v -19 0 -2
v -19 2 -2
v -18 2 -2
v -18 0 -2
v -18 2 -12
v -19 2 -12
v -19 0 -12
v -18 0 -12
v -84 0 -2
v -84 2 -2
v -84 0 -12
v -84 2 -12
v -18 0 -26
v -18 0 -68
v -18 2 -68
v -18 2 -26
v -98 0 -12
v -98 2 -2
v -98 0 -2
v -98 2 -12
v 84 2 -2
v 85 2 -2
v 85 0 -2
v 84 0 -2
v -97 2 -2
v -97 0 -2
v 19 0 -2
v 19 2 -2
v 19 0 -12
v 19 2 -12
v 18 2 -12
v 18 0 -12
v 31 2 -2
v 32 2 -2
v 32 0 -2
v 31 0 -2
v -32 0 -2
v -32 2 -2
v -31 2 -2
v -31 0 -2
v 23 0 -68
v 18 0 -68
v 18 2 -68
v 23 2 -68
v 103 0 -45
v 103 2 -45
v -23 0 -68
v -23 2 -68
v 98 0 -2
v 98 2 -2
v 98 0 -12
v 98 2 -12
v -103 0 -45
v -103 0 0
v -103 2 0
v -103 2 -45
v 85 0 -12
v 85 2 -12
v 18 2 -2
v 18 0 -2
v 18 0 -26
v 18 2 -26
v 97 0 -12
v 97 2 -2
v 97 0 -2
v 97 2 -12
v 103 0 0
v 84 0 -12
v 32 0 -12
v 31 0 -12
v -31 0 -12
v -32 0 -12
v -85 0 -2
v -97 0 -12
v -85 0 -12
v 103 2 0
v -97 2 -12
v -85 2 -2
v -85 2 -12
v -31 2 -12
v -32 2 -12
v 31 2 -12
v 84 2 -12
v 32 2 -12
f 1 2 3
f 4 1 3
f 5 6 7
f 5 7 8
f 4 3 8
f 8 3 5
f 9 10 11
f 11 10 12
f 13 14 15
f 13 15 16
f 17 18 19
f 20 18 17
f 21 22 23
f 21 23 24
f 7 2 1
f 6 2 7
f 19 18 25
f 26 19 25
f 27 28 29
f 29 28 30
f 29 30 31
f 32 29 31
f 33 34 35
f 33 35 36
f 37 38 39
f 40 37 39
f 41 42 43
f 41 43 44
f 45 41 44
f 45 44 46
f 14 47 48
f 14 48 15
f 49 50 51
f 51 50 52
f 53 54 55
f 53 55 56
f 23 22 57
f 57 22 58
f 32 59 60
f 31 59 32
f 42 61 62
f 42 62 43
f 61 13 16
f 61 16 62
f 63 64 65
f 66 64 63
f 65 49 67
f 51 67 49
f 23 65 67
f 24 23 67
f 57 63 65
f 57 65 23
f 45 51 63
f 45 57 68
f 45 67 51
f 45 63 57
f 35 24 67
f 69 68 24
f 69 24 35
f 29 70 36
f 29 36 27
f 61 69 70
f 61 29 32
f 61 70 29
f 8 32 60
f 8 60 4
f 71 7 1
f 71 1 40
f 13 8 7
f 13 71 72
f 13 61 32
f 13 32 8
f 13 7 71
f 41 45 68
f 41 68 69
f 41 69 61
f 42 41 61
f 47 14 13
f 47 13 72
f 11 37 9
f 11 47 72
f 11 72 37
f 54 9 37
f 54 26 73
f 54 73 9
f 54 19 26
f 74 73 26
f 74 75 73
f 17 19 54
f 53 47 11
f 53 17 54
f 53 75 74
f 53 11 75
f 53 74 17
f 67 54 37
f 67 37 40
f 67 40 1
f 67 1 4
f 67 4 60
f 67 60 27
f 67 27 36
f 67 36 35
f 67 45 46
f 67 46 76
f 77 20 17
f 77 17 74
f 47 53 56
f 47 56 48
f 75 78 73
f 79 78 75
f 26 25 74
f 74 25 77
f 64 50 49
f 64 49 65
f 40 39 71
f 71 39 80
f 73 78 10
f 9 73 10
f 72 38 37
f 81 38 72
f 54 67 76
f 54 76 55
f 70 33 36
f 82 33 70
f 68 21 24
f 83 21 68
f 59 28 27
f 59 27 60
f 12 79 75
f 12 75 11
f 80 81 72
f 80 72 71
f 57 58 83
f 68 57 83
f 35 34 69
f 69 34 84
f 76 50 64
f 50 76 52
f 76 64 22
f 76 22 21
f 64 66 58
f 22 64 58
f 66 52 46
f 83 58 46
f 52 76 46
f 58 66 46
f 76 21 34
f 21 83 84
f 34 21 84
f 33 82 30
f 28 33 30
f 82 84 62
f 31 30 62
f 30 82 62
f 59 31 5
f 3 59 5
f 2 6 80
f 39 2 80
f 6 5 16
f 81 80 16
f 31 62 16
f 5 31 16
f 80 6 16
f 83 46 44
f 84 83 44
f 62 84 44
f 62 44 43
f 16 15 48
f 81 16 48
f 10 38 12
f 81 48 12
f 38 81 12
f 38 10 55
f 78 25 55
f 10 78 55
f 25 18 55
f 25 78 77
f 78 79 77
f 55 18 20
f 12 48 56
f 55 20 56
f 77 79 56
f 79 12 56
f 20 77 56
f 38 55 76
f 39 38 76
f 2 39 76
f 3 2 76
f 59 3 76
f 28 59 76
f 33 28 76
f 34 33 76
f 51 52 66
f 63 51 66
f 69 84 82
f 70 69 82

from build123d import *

# Parameters (mm, degrees)
BOSS_EXTRUDE1_DEPTH = 2
SKETCH4_W           = 1
SKETCH4_H           = 10
CUT_EXTRUDE1_DEPTH  = 124.438243669


with BuildPart() as part:
    # Sketch3 → Boss-Extrude1 (new body)
    with BuildSketch(Plane(origin=(0, 0, 0), x_dir=(1, 0, 0), z_dir=(0, 1, 0))):
        Polygon((-103, 0), (-103, 45), (-23, 68), (-18, 68), (-18, 26), (18, 26), (18, 68), (23, 68), (103, 45), (103, 0), align=None)
    extrude(amount=BOSS_EXTRUDE1_DEPTH)

    # Sketch4 → Cut-Extrude1 (cut, through all)
    with BuildSketch(Plane(origin=(0, 2, 0), x_dir=(1, 0, 0), z_dir=(0, 1, 0))):
        with Locations((-97.5, 7)):
            Rectangle(SKETCH4_W, SKETCH4_H)
        with Locations((-84.5, 7)):
            Rectangle(SKETCH4_W, SKETCH4_H)
        with Locations((-31.5, 7)):
            Rectangle(SKETCH4_W, SKETCH4_H)
        with Locations((-18.5, 7)):
            Rectangle(SKETCH4_W, SKETCH4_H)
    cut_extrude1 = extrude(amount=-CUT_EXTRUDE1_DEPTH, mode=Mode.SUBTRACT)

    # Mirror1: Cut-Extrude1 across plane
    add(cut_extrude1.mirror(Plane.ZY), mode=Mode.SUBTRACT)


solid = part.part
